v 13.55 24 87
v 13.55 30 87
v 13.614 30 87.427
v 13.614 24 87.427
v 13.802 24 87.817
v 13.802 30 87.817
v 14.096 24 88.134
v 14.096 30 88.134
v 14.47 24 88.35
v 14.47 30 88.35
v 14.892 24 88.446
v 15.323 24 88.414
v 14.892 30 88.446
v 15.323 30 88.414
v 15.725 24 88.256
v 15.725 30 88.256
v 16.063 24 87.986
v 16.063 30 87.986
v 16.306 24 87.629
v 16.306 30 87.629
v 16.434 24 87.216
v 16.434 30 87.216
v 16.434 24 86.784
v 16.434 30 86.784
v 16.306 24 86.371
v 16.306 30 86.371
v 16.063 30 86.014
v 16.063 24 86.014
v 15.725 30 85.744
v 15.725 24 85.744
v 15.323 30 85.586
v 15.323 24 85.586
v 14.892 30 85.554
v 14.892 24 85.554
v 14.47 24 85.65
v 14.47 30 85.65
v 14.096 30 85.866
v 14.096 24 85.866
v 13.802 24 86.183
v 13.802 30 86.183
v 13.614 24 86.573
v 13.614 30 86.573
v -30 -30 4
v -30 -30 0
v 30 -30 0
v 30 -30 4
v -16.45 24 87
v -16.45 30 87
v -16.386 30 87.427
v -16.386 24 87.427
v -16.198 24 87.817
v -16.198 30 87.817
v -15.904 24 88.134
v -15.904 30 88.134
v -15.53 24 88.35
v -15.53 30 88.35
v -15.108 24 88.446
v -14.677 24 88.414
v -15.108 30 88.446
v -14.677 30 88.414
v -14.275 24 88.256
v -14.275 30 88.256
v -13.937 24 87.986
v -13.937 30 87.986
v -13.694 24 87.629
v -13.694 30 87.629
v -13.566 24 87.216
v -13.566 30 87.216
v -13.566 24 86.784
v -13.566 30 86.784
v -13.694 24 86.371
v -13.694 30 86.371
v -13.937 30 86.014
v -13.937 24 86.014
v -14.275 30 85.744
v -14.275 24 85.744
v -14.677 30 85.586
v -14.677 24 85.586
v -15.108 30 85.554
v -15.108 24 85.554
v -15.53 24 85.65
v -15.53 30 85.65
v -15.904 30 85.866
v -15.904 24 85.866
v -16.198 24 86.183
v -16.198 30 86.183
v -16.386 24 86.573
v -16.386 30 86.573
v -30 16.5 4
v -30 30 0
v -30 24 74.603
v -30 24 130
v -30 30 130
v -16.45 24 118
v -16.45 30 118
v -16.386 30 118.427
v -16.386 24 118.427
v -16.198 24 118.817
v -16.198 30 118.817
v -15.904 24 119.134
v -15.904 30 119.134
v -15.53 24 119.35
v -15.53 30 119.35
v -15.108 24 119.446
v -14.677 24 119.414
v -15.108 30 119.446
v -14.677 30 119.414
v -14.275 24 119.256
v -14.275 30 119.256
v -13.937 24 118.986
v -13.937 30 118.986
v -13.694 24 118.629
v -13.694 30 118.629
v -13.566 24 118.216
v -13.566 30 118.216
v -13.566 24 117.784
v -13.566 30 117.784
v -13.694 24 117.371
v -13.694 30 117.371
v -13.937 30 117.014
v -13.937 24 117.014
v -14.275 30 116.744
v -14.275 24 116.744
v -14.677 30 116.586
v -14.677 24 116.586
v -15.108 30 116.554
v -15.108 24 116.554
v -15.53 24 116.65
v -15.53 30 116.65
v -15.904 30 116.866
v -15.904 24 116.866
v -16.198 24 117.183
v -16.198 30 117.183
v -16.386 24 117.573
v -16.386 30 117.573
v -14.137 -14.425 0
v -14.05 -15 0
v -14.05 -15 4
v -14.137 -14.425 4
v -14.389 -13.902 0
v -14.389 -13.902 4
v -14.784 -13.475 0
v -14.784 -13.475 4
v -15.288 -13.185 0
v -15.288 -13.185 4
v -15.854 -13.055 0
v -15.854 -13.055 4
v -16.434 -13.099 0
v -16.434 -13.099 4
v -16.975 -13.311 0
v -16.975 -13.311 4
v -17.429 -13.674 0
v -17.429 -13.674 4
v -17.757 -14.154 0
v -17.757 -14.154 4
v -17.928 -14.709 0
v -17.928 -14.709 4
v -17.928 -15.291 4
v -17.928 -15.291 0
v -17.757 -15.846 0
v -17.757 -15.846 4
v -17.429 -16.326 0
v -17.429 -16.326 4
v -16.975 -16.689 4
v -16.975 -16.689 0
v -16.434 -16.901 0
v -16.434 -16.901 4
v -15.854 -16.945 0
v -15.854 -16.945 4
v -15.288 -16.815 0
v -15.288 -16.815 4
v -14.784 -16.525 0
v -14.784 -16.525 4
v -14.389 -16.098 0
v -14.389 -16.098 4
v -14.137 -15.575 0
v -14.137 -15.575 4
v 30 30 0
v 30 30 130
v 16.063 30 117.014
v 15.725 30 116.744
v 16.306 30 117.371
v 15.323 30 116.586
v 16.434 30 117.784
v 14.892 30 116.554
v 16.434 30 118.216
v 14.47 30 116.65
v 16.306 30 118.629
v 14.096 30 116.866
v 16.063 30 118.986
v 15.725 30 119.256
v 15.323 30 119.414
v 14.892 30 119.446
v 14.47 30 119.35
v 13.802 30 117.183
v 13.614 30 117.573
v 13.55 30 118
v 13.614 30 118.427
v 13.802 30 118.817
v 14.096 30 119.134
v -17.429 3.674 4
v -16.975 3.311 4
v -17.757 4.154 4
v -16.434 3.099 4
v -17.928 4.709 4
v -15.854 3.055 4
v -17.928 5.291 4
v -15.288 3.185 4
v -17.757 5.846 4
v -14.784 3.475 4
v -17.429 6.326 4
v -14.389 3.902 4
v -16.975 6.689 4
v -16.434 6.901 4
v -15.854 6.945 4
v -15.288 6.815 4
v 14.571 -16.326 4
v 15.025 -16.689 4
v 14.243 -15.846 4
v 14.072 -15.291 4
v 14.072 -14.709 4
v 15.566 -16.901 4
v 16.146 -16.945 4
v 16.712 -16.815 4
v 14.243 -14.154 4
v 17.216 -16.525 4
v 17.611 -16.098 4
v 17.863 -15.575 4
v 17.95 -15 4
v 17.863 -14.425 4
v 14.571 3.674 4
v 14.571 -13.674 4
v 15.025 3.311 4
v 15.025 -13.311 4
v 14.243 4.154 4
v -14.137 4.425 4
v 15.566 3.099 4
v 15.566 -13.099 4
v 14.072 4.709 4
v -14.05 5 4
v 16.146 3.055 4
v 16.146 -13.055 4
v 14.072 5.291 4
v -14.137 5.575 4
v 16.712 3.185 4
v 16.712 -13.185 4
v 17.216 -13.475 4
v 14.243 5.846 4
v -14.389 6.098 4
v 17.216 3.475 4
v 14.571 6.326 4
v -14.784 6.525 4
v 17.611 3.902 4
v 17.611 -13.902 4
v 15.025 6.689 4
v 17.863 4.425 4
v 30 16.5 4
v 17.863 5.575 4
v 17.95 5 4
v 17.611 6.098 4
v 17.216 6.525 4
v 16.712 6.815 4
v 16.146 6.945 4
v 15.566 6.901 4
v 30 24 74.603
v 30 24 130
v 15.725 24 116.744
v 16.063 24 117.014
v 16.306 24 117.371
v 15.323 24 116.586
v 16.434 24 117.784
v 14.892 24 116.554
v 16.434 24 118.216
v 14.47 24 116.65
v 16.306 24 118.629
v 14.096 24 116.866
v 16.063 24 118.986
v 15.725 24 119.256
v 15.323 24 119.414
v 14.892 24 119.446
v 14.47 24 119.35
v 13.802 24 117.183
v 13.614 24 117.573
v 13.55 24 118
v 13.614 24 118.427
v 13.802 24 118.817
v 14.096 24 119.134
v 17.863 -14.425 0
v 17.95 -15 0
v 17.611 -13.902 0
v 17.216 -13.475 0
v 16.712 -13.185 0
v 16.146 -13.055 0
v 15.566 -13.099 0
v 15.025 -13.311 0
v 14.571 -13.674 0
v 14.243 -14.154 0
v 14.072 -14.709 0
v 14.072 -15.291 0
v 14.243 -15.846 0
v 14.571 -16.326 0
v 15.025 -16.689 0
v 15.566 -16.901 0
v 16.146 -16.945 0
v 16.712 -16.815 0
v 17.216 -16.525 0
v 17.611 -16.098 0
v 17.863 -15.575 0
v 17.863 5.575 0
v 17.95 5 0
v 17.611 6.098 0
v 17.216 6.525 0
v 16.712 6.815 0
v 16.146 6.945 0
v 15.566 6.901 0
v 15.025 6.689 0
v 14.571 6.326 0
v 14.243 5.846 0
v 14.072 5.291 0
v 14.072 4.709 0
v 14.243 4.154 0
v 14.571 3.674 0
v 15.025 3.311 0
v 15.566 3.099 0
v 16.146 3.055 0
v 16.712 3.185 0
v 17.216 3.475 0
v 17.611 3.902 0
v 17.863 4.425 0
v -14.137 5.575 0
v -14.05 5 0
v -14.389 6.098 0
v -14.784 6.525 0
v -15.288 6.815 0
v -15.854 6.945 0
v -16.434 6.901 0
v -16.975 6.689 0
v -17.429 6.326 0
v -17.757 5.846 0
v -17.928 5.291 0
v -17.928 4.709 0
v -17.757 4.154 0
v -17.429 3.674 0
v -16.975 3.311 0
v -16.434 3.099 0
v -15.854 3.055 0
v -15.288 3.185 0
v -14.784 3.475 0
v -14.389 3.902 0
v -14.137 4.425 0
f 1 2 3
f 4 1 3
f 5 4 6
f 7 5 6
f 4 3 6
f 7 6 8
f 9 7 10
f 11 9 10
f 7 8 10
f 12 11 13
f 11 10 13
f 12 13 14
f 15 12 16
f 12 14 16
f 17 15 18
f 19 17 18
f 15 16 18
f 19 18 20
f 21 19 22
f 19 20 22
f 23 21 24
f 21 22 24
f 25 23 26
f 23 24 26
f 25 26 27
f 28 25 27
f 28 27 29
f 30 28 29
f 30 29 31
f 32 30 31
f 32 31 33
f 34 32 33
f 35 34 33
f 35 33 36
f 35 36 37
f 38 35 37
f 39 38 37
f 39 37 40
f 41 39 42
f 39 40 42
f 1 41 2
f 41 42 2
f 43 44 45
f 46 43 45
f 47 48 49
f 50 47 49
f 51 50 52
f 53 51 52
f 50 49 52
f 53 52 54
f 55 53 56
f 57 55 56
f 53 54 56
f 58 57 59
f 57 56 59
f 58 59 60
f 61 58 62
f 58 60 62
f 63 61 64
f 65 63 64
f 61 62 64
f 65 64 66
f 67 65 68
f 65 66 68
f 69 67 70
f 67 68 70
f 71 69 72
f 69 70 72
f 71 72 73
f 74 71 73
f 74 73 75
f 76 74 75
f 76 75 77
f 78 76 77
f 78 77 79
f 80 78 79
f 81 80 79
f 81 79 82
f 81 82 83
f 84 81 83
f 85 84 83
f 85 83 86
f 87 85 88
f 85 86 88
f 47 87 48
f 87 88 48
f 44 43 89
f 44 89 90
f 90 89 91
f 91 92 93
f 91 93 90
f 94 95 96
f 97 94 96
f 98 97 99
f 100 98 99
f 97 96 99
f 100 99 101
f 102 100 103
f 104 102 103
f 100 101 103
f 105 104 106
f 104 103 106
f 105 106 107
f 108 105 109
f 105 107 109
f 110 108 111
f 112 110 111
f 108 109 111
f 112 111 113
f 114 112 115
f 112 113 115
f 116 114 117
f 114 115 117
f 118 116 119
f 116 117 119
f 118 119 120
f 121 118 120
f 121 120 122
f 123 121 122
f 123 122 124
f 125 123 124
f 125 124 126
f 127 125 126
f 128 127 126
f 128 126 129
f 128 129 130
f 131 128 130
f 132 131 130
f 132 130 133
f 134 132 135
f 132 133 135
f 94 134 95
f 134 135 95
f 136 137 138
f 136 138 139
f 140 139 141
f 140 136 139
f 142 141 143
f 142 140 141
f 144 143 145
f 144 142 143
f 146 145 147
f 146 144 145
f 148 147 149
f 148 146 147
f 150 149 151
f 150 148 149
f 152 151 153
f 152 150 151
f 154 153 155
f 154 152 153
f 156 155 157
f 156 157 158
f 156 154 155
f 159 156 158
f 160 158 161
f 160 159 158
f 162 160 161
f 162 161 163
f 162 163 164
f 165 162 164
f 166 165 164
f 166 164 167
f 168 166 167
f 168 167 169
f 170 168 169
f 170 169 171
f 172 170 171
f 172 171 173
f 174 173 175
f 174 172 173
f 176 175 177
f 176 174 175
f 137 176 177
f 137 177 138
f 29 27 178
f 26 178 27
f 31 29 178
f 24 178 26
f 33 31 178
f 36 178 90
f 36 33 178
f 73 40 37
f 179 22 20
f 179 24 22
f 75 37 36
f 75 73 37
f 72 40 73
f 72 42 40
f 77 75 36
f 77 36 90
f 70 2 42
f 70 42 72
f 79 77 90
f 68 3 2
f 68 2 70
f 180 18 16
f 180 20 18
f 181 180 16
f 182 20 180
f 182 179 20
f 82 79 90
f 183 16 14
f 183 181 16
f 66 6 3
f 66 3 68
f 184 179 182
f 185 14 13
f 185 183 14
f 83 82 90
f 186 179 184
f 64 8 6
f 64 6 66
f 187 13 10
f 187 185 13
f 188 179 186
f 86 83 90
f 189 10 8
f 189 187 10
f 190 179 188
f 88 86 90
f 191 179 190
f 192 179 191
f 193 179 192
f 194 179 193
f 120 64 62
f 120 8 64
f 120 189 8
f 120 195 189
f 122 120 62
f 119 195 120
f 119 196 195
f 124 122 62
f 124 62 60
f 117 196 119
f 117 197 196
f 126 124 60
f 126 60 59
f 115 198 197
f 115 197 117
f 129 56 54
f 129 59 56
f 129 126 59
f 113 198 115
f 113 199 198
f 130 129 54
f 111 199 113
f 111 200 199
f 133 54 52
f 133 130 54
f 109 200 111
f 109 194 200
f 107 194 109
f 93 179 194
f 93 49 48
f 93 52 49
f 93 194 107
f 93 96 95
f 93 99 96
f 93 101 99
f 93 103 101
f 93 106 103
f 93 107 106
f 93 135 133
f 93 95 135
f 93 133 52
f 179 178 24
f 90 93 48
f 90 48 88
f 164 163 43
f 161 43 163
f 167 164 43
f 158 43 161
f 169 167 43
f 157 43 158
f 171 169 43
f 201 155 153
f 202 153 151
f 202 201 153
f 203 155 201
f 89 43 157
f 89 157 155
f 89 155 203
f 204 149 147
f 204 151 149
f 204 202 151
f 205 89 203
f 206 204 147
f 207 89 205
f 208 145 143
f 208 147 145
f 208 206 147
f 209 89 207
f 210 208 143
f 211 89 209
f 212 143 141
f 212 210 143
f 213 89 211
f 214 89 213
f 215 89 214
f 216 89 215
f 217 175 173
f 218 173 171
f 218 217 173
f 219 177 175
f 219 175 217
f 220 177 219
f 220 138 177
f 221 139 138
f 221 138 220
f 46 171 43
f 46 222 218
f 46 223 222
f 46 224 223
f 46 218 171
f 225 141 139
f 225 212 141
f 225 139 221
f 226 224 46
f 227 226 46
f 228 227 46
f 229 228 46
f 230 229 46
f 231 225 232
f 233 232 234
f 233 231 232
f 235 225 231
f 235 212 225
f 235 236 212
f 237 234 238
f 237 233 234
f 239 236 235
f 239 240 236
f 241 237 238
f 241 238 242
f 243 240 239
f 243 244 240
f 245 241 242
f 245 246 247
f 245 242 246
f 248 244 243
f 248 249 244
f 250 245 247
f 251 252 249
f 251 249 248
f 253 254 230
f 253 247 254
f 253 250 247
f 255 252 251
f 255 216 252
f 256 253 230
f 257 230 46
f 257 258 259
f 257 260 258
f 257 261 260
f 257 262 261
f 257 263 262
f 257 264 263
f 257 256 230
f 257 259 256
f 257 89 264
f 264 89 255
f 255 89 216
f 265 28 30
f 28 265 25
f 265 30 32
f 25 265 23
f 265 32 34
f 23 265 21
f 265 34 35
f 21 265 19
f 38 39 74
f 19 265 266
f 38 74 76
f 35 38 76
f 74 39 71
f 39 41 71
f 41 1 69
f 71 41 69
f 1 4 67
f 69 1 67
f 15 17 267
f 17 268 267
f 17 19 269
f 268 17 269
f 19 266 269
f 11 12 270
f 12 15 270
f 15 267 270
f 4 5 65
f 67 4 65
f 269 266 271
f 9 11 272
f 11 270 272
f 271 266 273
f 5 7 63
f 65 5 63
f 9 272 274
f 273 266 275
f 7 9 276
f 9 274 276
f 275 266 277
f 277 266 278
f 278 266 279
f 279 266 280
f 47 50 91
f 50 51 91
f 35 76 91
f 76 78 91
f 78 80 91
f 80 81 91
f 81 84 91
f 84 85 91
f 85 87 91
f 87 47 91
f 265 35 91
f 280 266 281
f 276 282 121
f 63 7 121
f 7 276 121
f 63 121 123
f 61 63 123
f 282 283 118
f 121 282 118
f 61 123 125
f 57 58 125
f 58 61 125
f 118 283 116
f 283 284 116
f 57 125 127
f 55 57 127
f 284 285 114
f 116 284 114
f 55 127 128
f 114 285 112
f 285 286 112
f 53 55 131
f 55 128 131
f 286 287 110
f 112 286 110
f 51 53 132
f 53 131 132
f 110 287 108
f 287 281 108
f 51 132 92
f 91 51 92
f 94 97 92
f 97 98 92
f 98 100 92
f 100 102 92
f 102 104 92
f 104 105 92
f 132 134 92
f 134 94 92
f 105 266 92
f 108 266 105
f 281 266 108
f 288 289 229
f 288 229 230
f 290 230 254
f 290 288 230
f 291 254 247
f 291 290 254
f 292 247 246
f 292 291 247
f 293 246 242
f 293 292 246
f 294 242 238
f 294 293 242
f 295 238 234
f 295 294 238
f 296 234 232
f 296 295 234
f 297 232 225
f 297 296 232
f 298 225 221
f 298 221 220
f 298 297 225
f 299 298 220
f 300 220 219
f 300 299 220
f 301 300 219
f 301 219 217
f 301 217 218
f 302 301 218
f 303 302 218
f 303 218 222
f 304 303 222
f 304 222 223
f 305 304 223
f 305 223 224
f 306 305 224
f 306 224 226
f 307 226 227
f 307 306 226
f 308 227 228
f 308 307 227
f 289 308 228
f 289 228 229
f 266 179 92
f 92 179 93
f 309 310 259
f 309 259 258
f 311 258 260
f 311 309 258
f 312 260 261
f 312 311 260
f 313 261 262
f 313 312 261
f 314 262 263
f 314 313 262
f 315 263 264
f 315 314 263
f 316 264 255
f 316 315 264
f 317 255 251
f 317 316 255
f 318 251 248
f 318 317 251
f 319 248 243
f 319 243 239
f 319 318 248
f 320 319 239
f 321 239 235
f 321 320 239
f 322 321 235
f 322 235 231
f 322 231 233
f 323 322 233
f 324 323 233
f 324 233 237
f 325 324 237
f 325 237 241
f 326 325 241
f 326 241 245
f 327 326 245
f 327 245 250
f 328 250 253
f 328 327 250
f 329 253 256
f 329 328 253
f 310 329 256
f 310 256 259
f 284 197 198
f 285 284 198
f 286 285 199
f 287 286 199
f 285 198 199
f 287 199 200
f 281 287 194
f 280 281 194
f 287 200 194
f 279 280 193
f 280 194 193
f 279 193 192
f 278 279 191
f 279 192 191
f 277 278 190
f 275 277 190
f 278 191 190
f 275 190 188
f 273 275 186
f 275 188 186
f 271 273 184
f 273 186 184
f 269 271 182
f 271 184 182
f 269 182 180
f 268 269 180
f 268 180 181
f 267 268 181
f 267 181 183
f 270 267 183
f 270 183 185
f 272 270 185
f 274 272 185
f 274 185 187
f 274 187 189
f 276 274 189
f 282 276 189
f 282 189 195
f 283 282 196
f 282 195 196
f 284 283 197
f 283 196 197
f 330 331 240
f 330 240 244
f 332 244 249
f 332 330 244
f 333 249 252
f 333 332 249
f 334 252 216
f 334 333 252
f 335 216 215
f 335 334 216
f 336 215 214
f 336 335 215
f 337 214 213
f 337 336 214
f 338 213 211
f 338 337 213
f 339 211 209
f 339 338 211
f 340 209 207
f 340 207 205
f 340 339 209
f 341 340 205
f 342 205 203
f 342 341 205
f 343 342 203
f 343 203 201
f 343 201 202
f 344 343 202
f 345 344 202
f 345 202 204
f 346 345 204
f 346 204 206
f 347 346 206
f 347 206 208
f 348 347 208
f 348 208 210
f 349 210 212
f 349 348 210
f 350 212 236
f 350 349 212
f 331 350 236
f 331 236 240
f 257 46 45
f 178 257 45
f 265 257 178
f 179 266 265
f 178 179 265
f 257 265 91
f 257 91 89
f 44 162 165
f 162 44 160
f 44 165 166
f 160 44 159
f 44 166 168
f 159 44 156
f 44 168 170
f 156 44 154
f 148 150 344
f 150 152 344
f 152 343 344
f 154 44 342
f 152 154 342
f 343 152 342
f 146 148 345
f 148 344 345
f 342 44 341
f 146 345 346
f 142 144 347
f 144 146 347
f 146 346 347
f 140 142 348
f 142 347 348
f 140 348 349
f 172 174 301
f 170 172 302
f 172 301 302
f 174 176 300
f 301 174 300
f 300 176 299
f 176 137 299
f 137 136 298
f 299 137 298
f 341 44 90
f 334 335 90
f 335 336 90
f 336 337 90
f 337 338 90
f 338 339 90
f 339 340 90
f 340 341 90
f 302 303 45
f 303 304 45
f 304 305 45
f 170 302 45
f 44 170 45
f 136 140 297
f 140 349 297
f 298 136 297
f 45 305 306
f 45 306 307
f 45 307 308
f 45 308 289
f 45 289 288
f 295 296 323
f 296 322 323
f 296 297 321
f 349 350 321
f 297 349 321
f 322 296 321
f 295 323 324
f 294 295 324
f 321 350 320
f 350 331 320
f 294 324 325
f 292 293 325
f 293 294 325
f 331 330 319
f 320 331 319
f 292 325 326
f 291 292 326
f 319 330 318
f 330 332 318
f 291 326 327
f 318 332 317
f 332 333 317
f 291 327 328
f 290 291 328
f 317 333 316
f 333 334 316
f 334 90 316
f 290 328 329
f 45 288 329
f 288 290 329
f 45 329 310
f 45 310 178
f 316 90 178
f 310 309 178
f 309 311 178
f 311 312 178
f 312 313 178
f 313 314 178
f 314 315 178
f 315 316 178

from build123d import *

# Parameters (mm, degrees)
F0_W     = 60
F0_H     = 60
F0_R     = 1.95
F1_DEPTH = 4
F2_W     = 60
F2_H     = 126
F2_R     = 1.45
F3_DEPTH = 6
F5_DEPTH = 60


with BuildPart() as f1:
    # F0 (on Top) → F1 (new body)
    with BuildSketch(Plane.XY):
        Rectangle(F0_W, F0_H)
        with Locations((-16, -15)):
            Circle(F0_R, mode=Mode.SUBTRACT)
        with Locations((16, -15)):
            Circle(F0_R, mode=Mode.SUBTRACT)
        with Locations((-16, 5)):
            Circle(F0_R, mode=Mode.SUBTRACT)
        with Locations((16, 5)):
            Circle(F0_R, mode=Mode.SUBTRACT)
    extrude(amount=F1_DEPTH)

    # F2 (on face) → F3 (join)
    with BuildSketch(Plane(origin=(0, 30, 0), x_dir=(-1, 0, 0), z_dir=(0, 1, 0))):
        with Locations((0, 67)):
            Rectangle(F2_W, F2_H)
        with Locations((-15, 87)):
            Circle(F2_R, mode=Mode.SUBTRACT)
        with Locations((-15, 118)):
            Circle(F2_R, mode=Mode.SUBTRACT)
        with Locations((15, 87)):
            Circle(F2_R, mode=Mode.SUBTRACT)
        with Locations((15, 118)):
            Circle(F2_R, mode=Mode.SUBTRACT)
    extrude(amount=-F3_DEPTH)

    # F4 (on face) → F5 (join)
    with BuildSketch(Plane.YZ.offset(30)):
        Polygon((24, 74.602762), (16.5, 4), (24, 4), align=None)
    extrude(amount=-F5_DEPTH)


solid = f1.part
